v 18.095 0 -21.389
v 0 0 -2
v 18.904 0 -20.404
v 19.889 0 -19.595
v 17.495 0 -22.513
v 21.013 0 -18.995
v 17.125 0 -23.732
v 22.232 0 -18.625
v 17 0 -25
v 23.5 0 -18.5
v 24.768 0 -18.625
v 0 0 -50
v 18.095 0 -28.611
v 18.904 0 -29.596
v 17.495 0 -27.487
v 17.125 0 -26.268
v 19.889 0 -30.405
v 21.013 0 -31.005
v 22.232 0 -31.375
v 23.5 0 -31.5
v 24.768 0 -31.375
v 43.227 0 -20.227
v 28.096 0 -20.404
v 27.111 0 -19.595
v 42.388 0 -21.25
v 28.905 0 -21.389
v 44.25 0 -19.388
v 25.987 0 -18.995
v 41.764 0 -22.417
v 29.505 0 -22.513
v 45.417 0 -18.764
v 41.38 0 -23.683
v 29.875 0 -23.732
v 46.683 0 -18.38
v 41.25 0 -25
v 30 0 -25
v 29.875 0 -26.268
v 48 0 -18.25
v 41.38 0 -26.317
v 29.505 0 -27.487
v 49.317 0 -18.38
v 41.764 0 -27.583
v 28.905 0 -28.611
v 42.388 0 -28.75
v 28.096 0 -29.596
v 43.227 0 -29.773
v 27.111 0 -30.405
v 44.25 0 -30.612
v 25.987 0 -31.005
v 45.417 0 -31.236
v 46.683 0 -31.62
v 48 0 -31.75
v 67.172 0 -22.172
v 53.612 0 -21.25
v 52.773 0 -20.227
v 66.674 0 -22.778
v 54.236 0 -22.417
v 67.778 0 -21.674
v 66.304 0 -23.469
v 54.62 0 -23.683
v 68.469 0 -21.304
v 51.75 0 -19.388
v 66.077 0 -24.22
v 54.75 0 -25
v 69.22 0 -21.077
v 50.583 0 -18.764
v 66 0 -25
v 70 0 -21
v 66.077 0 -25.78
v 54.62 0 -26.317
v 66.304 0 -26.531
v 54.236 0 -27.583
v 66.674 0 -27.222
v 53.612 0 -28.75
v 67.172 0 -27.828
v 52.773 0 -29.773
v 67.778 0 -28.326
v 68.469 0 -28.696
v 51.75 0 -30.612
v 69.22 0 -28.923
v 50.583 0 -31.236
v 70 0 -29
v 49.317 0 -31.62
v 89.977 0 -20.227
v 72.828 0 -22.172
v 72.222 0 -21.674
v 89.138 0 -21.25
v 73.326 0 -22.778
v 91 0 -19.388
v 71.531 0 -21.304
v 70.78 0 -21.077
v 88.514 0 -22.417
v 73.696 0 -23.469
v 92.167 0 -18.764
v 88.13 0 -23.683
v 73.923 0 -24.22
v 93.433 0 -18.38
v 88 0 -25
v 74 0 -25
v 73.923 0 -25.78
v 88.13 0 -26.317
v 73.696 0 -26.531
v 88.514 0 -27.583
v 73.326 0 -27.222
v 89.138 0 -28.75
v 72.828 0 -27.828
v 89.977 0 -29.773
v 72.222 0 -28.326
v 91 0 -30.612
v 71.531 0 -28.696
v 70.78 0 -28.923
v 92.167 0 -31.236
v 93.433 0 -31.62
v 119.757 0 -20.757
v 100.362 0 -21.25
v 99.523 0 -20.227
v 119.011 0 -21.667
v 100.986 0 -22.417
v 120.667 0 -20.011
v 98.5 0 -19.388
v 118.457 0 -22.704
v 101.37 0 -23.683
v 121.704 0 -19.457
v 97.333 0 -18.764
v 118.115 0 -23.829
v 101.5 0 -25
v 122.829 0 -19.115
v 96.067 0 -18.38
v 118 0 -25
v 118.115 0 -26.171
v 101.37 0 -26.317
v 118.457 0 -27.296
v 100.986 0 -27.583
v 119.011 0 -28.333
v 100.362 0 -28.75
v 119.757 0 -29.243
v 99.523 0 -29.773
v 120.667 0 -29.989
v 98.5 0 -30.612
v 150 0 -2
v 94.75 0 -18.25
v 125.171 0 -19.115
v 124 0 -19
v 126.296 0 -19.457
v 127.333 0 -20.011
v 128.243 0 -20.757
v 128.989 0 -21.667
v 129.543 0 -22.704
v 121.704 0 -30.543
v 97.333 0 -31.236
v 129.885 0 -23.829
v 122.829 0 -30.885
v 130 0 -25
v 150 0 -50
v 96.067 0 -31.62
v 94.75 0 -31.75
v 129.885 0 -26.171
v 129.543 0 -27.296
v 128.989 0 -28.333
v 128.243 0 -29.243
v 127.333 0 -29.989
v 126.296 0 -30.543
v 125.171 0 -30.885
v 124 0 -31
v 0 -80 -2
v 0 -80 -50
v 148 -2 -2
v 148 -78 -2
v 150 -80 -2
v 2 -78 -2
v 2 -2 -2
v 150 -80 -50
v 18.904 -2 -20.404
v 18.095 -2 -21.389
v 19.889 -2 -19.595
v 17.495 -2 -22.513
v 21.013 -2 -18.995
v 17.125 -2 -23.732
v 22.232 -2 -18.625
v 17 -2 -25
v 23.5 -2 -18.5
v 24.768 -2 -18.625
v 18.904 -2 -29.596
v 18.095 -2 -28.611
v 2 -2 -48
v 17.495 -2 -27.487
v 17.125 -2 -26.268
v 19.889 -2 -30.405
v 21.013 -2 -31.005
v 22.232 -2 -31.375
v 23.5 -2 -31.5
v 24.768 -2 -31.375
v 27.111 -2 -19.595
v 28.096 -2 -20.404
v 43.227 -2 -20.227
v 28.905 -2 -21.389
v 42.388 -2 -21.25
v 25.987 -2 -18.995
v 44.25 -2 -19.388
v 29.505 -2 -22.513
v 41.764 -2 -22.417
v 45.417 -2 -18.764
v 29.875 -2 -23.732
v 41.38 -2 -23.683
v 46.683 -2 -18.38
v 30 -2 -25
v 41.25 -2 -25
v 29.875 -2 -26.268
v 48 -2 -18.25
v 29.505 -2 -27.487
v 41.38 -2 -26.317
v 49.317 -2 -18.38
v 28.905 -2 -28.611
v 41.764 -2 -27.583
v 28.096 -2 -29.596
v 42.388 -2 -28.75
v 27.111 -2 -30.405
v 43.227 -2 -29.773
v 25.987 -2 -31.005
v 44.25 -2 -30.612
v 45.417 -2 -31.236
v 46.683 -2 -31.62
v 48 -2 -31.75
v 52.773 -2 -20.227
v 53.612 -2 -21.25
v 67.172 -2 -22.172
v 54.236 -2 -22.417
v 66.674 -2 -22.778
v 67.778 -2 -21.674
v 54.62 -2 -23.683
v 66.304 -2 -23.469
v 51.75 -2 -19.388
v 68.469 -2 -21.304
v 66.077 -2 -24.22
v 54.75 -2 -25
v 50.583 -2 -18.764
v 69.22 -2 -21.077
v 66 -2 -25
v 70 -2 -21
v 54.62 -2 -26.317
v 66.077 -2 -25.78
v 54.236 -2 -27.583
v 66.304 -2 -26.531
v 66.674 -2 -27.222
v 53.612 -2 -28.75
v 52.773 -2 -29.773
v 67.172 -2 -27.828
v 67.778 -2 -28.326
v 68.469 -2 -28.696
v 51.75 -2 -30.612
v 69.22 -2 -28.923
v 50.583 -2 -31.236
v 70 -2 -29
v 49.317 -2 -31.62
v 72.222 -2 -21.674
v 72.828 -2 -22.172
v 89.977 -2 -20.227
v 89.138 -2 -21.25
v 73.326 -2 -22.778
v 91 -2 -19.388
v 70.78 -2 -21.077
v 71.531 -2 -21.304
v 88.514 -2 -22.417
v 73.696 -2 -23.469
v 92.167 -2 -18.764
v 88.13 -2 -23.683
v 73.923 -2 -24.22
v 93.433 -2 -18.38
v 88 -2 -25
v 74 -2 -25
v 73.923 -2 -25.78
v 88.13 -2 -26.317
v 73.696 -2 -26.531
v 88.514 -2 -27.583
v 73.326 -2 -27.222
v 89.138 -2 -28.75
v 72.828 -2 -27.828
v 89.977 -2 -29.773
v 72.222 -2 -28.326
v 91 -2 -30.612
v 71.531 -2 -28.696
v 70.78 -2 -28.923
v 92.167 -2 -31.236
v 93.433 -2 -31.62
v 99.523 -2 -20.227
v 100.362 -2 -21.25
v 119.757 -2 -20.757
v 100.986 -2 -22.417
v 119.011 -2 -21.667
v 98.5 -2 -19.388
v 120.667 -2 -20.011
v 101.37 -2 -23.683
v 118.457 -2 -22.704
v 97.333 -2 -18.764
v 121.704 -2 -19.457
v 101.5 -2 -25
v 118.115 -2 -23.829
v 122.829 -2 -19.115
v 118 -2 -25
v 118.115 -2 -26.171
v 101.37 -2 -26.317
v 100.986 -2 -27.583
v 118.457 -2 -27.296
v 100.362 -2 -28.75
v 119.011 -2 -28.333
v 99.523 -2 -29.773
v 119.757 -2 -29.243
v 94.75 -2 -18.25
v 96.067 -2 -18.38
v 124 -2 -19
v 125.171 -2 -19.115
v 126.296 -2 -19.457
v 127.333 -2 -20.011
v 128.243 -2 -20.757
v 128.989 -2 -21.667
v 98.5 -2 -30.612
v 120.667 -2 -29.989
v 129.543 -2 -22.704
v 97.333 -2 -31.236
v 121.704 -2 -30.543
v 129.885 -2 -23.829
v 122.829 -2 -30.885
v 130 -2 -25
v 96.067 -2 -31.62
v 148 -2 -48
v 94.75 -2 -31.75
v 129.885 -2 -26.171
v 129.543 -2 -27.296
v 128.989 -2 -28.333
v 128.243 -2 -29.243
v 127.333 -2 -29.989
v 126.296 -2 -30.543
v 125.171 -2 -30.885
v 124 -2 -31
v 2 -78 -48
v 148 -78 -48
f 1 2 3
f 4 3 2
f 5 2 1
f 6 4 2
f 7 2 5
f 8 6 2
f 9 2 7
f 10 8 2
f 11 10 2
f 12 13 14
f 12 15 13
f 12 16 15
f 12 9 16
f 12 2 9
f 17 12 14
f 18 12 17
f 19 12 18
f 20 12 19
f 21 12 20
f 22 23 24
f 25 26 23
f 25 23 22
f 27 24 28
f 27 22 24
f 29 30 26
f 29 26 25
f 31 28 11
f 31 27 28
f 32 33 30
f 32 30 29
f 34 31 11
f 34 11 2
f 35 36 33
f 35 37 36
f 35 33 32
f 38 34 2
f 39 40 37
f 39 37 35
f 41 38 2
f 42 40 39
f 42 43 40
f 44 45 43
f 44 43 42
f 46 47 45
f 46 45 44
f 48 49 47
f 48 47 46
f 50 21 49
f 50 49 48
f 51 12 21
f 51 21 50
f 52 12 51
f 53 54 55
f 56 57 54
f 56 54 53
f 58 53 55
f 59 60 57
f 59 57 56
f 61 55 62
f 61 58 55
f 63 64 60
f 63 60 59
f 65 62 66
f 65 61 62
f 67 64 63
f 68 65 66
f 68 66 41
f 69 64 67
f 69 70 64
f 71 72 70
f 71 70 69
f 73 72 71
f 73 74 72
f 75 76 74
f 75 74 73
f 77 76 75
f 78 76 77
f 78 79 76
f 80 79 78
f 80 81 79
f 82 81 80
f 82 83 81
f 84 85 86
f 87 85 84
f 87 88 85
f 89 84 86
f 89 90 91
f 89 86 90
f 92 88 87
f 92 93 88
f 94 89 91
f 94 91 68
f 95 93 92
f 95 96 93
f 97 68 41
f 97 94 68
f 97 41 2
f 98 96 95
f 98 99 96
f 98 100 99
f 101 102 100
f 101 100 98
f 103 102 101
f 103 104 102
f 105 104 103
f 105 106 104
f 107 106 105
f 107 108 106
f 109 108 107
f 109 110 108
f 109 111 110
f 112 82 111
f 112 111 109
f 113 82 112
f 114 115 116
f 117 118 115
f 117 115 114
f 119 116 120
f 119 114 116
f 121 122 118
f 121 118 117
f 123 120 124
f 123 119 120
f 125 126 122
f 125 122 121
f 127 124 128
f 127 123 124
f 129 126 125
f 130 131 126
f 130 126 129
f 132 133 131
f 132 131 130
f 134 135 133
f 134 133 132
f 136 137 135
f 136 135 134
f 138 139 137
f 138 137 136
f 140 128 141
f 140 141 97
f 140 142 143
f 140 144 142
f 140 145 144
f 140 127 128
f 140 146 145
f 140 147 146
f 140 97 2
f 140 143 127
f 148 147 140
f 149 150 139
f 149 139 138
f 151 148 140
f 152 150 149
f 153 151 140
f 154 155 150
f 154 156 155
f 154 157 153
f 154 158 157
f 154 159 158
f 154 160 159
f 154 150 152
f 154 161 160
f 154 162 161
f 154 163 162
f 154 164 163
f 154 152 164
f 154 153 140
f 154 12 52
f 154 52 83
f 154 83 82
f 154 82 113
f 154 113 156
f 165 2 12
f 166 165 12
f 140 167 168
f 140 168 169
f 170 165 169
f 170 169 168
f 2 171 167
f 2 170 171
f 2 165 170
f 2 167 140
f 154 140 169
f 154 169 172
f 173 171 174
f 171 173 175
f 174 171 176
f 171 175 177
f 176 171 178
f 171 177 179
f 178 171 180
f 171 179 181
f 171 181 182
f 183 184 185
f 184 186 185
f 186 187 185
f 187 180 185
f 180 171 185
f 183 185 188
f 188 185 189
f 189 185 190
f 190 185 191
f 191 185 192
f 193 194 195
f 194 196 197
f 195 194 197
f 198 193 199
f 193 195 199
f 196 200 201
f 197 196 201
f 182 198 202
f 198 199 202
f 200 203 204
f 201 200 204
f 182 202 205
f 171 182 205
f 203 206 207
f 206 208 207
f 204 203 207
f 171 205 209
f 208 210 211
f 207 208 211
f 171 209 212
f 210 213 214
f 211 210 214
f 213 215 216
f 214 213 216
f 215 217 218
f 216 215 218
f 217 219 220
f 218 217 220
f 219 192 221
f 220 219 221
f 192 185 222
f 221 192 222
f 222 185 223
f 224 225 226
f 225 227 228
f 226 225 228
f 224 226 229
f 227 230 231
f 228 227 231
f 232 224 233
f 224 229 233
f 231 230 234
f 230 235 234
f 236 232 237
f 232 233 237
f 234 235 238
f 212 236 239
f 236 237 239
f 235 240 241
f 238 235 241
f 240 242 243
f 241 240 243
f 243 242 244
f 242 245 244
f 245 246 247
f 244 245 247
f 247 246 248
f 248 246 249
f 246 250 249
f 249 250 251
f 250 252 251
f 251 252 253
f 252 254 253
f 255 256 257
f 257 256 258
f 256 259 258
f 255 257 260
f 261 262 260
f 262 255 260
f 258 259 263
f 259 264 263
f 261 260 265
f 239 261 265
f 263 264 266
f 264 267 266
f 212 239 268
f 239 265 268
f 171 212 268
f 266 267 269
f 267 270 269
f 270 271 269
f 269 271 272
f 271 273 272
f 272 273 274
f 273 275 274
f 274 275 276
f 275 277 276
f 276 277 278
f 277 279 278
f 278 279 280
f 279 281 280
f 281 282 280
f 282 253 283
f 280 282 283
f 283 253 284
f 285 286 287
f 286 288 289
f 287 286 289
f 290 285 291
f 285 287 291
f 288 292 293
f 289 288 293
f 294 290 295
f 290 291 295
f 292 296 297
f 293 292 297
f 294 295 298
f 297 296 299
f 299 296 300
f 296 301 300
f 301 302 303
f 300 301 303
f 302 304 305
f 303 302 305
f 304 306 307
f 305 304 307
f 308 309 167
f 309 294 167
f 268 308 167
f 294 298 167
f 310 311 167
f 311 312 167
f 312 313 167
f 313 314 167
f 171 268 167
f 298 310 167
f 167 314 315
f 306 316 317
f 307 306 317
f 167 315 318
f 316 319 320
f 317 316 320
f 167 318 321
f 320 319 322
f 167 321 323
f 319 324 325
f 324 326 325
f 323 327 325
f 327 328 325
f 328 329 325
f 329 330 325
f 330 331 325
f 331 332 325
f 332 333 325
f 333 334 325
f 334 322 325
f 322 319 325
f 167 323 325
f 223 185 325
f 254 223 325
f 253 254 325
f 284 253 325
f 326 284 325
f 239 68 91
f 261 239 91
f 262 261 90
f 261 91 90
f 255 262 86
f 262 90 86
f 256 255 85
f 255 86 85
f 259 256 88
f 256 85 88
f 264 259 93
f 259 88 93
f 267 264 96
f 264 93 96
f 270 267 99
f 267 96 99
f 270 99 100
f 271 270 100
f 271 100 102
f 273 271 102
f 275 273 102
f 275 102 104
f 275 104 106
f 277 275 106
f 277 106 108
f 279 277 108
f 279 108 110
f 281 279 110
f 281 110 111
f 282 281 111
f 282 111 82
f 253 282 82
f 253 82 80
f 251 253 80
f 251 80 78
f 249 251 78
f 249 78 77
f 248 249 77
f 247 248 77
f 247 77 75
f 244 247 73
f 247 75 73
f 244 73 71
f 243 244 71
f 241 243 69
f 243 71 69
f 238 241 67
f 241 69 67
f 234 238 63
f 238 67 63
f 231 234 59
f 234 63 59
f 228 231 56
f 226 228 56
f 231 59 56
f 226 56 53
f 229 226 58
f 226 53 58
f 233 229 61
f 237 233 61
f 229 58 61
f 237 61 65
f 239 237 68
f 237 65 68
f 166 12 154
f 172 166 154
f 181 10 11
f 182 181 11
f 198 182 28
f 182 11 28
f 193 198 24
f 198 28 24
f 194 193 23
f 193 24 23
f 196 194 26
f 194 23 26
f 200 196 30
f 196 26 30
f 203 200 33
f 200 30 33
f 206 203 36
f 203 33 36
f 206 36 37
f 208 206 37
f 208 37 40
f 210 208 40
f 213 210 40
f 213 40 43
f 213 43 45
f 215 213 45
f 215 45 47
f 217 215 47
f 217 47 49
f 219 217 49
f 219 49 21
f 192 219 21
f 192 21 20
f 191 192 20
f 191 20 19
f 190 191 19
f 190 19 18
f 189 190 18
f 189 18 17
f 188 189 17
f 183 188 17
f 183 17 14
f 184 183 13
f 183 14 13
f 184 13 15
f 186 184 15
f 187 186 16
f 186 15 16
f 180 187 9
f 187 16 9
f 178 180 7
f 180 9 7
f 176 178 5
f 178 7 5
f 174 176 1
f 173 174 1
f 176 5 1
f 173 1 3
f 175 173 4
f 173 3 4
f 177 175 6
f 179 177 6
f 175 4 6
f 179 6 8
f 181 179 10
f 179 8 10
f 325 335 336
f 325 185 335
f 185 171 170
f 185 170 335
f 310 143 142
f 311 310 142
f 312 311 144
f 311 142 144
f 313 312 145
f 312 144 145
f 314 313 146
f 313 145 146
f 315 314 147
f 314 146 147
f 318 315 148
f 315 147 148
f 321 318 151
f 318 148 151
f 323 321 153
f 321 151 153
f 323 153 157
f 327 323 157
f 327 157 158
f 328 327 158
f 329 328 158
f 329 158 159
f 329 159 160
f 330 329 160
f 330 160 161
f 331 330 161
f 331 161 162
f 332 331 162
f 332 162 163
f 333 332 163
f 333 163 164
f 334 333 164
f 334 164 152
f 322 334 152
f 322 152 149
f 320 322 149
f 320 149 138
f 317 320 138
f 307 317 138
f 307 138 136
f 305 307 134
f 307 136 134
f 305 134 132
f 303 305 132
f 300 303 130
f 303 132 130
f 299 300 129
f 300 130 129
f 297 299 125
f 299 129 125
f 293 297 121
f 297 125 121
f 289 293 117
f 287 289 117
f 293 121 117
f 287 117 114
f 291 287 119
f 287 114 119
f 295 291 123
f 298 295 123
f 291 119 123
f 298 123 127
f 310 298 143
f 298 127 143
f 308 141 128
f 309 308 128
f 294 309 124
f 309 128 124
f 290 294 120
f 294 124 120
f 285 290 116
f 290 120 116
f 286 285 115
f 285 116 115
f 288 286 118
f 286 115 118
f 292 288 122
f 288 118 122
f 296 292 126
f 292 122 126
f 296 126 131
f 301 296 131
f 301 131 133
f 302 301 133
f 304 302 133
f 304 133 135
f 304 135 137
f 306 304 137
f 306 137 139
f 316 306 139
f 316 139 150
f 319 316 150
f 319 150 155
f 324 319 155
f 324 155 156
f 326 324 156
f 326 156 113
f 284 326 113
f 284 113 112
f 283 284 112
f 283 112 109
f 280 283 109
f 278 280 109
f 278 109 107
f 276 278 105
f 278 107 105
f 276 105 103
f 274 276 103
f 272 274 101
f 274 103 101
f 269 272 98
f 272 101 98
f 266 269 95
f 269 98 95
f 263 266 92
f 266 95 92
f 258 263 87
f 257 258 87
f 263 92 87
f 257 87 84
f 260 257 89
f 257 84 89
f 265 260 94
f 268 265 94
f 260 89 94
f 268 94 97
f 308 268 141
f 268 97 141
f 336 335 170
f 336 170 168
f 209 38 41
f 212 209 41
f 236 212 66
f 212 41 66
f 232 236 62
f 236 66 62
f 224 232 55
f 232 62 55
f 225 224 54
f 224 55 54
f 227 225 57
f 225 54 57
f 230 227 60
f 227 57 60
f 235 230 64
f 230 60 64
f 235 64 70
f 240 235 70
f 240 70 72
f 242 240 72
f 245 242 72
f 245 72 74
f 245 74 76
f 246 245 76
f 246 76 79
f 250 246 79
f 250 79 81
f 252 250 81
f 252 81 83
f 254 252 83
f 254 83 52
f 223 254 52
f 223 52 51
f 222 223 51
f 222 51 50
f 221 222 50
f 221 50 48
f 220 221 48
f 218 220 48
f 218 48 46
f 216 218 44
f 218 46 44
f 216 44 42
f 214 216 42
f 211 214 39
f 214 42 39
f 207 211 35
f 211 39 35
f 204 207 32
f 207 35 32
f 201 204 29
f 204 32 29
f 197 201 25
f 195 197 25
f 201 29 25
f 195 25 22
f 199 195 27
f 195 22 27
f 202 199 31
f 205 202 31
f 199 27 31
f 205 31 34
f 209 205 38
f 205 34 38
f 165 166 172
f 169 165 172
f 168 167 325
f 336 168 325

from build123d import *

# Parameters (mm, degrees)
SKETCH1_W          = 150
SKETCH1_H          = 50
EXTRUDE5_DEPTH     = 80
SHELL1_T           = 2
EXTRUDE6_REACH     = 82
SKETCH8_R          = 6.5
SKETCH8_R_2        = 6.75
SKETCH8_R_3        = 4
SKETCH8_R_4        = 6
SKETCH12_W         = 2
SKETCH12_H         = 80
CUT_EXTRUDE1_DEPTH = 200


with BuildPart() as part:
    # Sketch1 → Extrude5 (new body)
    with BuildSketch(Plane(origin=(0, 0, 0), x_dir=(1, 0, 0), z_dir=(0, 1, 0))):
        with Locations((75, 25)):
            Rectangle(SKETCH1_W, SKETCH1_H)
    extrude(amount=-EXTRUDE5_DEPTH)

    # Shell1 (no face opened: a closed hollow body)
    add(offset(amount=-SHELL1_T, mode=Mode.PRIVATE), mode=Mode.SUBTRACT)

    # Sketch8 → Extrude6 (cut, up to next)
    with BuildSketch(Plane(origin=(0, 0, 0), x_dir=(1, 0, 0), z_dir=(0, 1, 0)), mode=Mode.PRIVATE) as extrude6_sk1:
        with Locations(Location((23.5, 25, 0), (0, 0, 270))):  # turned: the seam where the file's is
            Circle(SKETCH8_R)
    extrude6_tool1 = extrude(extrude6_sk1.sketch, amount=-EXTRUDE6_REACH, mode=Mode.PRIVATE) & part.part
    add(extrude6_tool1.solids().sort_by_distance((23.5, 0, -25))[0], mode=Mode.SUBTRACT)
    # Sketch8 → Extrude6 (cut, up to next)
    with BuildSketch(Plane(origin=(0, 0, 0), x_dir=(1, 0, 0), z_dir=(0, 1, 0)), mode=Mode.PRIVATE) as extrude6_sk2:
        with Locations(Location((48, 25, 0), (0, 0, 270))):  # turned: the seam where the file's is
            Circle(SKETCH8_R_2)
    extrude6_tool2 = extrude(extrude6_sk2.sketch, amount=-EXTRUDE6_REACH, mode=Mode.PRIVATE) & part.part
    add(extrude6_tool2.solids().sort_by_distance((48, 0, -25))[0], mode=Mode.SUBTRACT)
    # Sketch8 → Extrude6 (cut, up to next)
    with BuildSketch(Plane(origin=(0, 0, 0), x_dir=(1, 0, 0), z_dir=(0, 1, 0)), mode=Mode.PRIVATE) as extrude6_sk3:
        with Locations(Location((70, 25, 0), (0, 0, 270))):  # turned: the seam where the file's is
            Circle(SKETCH8_R_3)
    extrude6_tool3 = extrude(extrude6_sk3.sketch, amount=-EXTRUDE6_REACH, mode=Mode.PRIVATE) & part.part
    add(extrude6_tool3.solids().sort_by_distance((70, 0, -25))[0], mode=Mode.SUBTRACT)
    # Sketch8 → Extrude6 (cut, up to next)
    with BuildSketch(Plane(origin=(0, 0, 0), x_dir=(1, 0, 0), z_dir=(0, 1, 0)), mode=Mode.PRIVATE) as extrude6_sk4:
        with Locations(Location((94.75, 25, 0), (0, 0, 270))):  # turned: the seam where the file's is
            Circle(SKETCH8_R_2)
    extrude6_tool4 = extrude(extrude6_sk4.sketch, amount=-EXTRUDE6_REACH, mode=Mode.PRIVATE) & part.part
    add(extrude6_tool4.solids().sort_by_distance((94.75, 0, -25))[0], mode=Mode.SUBTRACT)
    # Sketch8 → Extrude6 (cut, up to next)
    with BuildSketch(Plane(origin=(0, 0, 0), x_dir=(1, 0, 0), z_dir=(0, 1, 0)), mode=Mode.PRIVATE) as extrude6_sk5:
        with Locations(Location((124, 25, 0), (0, 0, 270))):  # turned: the seam where the file's is
            Circle(SKETCH8_R_4)
    extrude6_tool5 = extrude(extrude6_sk5.sketch, amount=-EXTRUDE6_REACH, mode=Mode.PRIVATE) & part.part
    add(extrude6_tool5.solids().sort_by_distance((124, 0, -25))[0], mode=Mode.SUBTRACT)

    # Sketch12 → Cut-Extrude1 (cut)
    with BuildSketch(Plane.ZY):
        with Locations((-1, -40)):
            Rectangle(SKETCH12_W, SKETCH12_H)
    extrude(amount=-CUT_EXTRUDE1_DEPTH, mode=Mode.SUBTRACT)


solid = part.part
